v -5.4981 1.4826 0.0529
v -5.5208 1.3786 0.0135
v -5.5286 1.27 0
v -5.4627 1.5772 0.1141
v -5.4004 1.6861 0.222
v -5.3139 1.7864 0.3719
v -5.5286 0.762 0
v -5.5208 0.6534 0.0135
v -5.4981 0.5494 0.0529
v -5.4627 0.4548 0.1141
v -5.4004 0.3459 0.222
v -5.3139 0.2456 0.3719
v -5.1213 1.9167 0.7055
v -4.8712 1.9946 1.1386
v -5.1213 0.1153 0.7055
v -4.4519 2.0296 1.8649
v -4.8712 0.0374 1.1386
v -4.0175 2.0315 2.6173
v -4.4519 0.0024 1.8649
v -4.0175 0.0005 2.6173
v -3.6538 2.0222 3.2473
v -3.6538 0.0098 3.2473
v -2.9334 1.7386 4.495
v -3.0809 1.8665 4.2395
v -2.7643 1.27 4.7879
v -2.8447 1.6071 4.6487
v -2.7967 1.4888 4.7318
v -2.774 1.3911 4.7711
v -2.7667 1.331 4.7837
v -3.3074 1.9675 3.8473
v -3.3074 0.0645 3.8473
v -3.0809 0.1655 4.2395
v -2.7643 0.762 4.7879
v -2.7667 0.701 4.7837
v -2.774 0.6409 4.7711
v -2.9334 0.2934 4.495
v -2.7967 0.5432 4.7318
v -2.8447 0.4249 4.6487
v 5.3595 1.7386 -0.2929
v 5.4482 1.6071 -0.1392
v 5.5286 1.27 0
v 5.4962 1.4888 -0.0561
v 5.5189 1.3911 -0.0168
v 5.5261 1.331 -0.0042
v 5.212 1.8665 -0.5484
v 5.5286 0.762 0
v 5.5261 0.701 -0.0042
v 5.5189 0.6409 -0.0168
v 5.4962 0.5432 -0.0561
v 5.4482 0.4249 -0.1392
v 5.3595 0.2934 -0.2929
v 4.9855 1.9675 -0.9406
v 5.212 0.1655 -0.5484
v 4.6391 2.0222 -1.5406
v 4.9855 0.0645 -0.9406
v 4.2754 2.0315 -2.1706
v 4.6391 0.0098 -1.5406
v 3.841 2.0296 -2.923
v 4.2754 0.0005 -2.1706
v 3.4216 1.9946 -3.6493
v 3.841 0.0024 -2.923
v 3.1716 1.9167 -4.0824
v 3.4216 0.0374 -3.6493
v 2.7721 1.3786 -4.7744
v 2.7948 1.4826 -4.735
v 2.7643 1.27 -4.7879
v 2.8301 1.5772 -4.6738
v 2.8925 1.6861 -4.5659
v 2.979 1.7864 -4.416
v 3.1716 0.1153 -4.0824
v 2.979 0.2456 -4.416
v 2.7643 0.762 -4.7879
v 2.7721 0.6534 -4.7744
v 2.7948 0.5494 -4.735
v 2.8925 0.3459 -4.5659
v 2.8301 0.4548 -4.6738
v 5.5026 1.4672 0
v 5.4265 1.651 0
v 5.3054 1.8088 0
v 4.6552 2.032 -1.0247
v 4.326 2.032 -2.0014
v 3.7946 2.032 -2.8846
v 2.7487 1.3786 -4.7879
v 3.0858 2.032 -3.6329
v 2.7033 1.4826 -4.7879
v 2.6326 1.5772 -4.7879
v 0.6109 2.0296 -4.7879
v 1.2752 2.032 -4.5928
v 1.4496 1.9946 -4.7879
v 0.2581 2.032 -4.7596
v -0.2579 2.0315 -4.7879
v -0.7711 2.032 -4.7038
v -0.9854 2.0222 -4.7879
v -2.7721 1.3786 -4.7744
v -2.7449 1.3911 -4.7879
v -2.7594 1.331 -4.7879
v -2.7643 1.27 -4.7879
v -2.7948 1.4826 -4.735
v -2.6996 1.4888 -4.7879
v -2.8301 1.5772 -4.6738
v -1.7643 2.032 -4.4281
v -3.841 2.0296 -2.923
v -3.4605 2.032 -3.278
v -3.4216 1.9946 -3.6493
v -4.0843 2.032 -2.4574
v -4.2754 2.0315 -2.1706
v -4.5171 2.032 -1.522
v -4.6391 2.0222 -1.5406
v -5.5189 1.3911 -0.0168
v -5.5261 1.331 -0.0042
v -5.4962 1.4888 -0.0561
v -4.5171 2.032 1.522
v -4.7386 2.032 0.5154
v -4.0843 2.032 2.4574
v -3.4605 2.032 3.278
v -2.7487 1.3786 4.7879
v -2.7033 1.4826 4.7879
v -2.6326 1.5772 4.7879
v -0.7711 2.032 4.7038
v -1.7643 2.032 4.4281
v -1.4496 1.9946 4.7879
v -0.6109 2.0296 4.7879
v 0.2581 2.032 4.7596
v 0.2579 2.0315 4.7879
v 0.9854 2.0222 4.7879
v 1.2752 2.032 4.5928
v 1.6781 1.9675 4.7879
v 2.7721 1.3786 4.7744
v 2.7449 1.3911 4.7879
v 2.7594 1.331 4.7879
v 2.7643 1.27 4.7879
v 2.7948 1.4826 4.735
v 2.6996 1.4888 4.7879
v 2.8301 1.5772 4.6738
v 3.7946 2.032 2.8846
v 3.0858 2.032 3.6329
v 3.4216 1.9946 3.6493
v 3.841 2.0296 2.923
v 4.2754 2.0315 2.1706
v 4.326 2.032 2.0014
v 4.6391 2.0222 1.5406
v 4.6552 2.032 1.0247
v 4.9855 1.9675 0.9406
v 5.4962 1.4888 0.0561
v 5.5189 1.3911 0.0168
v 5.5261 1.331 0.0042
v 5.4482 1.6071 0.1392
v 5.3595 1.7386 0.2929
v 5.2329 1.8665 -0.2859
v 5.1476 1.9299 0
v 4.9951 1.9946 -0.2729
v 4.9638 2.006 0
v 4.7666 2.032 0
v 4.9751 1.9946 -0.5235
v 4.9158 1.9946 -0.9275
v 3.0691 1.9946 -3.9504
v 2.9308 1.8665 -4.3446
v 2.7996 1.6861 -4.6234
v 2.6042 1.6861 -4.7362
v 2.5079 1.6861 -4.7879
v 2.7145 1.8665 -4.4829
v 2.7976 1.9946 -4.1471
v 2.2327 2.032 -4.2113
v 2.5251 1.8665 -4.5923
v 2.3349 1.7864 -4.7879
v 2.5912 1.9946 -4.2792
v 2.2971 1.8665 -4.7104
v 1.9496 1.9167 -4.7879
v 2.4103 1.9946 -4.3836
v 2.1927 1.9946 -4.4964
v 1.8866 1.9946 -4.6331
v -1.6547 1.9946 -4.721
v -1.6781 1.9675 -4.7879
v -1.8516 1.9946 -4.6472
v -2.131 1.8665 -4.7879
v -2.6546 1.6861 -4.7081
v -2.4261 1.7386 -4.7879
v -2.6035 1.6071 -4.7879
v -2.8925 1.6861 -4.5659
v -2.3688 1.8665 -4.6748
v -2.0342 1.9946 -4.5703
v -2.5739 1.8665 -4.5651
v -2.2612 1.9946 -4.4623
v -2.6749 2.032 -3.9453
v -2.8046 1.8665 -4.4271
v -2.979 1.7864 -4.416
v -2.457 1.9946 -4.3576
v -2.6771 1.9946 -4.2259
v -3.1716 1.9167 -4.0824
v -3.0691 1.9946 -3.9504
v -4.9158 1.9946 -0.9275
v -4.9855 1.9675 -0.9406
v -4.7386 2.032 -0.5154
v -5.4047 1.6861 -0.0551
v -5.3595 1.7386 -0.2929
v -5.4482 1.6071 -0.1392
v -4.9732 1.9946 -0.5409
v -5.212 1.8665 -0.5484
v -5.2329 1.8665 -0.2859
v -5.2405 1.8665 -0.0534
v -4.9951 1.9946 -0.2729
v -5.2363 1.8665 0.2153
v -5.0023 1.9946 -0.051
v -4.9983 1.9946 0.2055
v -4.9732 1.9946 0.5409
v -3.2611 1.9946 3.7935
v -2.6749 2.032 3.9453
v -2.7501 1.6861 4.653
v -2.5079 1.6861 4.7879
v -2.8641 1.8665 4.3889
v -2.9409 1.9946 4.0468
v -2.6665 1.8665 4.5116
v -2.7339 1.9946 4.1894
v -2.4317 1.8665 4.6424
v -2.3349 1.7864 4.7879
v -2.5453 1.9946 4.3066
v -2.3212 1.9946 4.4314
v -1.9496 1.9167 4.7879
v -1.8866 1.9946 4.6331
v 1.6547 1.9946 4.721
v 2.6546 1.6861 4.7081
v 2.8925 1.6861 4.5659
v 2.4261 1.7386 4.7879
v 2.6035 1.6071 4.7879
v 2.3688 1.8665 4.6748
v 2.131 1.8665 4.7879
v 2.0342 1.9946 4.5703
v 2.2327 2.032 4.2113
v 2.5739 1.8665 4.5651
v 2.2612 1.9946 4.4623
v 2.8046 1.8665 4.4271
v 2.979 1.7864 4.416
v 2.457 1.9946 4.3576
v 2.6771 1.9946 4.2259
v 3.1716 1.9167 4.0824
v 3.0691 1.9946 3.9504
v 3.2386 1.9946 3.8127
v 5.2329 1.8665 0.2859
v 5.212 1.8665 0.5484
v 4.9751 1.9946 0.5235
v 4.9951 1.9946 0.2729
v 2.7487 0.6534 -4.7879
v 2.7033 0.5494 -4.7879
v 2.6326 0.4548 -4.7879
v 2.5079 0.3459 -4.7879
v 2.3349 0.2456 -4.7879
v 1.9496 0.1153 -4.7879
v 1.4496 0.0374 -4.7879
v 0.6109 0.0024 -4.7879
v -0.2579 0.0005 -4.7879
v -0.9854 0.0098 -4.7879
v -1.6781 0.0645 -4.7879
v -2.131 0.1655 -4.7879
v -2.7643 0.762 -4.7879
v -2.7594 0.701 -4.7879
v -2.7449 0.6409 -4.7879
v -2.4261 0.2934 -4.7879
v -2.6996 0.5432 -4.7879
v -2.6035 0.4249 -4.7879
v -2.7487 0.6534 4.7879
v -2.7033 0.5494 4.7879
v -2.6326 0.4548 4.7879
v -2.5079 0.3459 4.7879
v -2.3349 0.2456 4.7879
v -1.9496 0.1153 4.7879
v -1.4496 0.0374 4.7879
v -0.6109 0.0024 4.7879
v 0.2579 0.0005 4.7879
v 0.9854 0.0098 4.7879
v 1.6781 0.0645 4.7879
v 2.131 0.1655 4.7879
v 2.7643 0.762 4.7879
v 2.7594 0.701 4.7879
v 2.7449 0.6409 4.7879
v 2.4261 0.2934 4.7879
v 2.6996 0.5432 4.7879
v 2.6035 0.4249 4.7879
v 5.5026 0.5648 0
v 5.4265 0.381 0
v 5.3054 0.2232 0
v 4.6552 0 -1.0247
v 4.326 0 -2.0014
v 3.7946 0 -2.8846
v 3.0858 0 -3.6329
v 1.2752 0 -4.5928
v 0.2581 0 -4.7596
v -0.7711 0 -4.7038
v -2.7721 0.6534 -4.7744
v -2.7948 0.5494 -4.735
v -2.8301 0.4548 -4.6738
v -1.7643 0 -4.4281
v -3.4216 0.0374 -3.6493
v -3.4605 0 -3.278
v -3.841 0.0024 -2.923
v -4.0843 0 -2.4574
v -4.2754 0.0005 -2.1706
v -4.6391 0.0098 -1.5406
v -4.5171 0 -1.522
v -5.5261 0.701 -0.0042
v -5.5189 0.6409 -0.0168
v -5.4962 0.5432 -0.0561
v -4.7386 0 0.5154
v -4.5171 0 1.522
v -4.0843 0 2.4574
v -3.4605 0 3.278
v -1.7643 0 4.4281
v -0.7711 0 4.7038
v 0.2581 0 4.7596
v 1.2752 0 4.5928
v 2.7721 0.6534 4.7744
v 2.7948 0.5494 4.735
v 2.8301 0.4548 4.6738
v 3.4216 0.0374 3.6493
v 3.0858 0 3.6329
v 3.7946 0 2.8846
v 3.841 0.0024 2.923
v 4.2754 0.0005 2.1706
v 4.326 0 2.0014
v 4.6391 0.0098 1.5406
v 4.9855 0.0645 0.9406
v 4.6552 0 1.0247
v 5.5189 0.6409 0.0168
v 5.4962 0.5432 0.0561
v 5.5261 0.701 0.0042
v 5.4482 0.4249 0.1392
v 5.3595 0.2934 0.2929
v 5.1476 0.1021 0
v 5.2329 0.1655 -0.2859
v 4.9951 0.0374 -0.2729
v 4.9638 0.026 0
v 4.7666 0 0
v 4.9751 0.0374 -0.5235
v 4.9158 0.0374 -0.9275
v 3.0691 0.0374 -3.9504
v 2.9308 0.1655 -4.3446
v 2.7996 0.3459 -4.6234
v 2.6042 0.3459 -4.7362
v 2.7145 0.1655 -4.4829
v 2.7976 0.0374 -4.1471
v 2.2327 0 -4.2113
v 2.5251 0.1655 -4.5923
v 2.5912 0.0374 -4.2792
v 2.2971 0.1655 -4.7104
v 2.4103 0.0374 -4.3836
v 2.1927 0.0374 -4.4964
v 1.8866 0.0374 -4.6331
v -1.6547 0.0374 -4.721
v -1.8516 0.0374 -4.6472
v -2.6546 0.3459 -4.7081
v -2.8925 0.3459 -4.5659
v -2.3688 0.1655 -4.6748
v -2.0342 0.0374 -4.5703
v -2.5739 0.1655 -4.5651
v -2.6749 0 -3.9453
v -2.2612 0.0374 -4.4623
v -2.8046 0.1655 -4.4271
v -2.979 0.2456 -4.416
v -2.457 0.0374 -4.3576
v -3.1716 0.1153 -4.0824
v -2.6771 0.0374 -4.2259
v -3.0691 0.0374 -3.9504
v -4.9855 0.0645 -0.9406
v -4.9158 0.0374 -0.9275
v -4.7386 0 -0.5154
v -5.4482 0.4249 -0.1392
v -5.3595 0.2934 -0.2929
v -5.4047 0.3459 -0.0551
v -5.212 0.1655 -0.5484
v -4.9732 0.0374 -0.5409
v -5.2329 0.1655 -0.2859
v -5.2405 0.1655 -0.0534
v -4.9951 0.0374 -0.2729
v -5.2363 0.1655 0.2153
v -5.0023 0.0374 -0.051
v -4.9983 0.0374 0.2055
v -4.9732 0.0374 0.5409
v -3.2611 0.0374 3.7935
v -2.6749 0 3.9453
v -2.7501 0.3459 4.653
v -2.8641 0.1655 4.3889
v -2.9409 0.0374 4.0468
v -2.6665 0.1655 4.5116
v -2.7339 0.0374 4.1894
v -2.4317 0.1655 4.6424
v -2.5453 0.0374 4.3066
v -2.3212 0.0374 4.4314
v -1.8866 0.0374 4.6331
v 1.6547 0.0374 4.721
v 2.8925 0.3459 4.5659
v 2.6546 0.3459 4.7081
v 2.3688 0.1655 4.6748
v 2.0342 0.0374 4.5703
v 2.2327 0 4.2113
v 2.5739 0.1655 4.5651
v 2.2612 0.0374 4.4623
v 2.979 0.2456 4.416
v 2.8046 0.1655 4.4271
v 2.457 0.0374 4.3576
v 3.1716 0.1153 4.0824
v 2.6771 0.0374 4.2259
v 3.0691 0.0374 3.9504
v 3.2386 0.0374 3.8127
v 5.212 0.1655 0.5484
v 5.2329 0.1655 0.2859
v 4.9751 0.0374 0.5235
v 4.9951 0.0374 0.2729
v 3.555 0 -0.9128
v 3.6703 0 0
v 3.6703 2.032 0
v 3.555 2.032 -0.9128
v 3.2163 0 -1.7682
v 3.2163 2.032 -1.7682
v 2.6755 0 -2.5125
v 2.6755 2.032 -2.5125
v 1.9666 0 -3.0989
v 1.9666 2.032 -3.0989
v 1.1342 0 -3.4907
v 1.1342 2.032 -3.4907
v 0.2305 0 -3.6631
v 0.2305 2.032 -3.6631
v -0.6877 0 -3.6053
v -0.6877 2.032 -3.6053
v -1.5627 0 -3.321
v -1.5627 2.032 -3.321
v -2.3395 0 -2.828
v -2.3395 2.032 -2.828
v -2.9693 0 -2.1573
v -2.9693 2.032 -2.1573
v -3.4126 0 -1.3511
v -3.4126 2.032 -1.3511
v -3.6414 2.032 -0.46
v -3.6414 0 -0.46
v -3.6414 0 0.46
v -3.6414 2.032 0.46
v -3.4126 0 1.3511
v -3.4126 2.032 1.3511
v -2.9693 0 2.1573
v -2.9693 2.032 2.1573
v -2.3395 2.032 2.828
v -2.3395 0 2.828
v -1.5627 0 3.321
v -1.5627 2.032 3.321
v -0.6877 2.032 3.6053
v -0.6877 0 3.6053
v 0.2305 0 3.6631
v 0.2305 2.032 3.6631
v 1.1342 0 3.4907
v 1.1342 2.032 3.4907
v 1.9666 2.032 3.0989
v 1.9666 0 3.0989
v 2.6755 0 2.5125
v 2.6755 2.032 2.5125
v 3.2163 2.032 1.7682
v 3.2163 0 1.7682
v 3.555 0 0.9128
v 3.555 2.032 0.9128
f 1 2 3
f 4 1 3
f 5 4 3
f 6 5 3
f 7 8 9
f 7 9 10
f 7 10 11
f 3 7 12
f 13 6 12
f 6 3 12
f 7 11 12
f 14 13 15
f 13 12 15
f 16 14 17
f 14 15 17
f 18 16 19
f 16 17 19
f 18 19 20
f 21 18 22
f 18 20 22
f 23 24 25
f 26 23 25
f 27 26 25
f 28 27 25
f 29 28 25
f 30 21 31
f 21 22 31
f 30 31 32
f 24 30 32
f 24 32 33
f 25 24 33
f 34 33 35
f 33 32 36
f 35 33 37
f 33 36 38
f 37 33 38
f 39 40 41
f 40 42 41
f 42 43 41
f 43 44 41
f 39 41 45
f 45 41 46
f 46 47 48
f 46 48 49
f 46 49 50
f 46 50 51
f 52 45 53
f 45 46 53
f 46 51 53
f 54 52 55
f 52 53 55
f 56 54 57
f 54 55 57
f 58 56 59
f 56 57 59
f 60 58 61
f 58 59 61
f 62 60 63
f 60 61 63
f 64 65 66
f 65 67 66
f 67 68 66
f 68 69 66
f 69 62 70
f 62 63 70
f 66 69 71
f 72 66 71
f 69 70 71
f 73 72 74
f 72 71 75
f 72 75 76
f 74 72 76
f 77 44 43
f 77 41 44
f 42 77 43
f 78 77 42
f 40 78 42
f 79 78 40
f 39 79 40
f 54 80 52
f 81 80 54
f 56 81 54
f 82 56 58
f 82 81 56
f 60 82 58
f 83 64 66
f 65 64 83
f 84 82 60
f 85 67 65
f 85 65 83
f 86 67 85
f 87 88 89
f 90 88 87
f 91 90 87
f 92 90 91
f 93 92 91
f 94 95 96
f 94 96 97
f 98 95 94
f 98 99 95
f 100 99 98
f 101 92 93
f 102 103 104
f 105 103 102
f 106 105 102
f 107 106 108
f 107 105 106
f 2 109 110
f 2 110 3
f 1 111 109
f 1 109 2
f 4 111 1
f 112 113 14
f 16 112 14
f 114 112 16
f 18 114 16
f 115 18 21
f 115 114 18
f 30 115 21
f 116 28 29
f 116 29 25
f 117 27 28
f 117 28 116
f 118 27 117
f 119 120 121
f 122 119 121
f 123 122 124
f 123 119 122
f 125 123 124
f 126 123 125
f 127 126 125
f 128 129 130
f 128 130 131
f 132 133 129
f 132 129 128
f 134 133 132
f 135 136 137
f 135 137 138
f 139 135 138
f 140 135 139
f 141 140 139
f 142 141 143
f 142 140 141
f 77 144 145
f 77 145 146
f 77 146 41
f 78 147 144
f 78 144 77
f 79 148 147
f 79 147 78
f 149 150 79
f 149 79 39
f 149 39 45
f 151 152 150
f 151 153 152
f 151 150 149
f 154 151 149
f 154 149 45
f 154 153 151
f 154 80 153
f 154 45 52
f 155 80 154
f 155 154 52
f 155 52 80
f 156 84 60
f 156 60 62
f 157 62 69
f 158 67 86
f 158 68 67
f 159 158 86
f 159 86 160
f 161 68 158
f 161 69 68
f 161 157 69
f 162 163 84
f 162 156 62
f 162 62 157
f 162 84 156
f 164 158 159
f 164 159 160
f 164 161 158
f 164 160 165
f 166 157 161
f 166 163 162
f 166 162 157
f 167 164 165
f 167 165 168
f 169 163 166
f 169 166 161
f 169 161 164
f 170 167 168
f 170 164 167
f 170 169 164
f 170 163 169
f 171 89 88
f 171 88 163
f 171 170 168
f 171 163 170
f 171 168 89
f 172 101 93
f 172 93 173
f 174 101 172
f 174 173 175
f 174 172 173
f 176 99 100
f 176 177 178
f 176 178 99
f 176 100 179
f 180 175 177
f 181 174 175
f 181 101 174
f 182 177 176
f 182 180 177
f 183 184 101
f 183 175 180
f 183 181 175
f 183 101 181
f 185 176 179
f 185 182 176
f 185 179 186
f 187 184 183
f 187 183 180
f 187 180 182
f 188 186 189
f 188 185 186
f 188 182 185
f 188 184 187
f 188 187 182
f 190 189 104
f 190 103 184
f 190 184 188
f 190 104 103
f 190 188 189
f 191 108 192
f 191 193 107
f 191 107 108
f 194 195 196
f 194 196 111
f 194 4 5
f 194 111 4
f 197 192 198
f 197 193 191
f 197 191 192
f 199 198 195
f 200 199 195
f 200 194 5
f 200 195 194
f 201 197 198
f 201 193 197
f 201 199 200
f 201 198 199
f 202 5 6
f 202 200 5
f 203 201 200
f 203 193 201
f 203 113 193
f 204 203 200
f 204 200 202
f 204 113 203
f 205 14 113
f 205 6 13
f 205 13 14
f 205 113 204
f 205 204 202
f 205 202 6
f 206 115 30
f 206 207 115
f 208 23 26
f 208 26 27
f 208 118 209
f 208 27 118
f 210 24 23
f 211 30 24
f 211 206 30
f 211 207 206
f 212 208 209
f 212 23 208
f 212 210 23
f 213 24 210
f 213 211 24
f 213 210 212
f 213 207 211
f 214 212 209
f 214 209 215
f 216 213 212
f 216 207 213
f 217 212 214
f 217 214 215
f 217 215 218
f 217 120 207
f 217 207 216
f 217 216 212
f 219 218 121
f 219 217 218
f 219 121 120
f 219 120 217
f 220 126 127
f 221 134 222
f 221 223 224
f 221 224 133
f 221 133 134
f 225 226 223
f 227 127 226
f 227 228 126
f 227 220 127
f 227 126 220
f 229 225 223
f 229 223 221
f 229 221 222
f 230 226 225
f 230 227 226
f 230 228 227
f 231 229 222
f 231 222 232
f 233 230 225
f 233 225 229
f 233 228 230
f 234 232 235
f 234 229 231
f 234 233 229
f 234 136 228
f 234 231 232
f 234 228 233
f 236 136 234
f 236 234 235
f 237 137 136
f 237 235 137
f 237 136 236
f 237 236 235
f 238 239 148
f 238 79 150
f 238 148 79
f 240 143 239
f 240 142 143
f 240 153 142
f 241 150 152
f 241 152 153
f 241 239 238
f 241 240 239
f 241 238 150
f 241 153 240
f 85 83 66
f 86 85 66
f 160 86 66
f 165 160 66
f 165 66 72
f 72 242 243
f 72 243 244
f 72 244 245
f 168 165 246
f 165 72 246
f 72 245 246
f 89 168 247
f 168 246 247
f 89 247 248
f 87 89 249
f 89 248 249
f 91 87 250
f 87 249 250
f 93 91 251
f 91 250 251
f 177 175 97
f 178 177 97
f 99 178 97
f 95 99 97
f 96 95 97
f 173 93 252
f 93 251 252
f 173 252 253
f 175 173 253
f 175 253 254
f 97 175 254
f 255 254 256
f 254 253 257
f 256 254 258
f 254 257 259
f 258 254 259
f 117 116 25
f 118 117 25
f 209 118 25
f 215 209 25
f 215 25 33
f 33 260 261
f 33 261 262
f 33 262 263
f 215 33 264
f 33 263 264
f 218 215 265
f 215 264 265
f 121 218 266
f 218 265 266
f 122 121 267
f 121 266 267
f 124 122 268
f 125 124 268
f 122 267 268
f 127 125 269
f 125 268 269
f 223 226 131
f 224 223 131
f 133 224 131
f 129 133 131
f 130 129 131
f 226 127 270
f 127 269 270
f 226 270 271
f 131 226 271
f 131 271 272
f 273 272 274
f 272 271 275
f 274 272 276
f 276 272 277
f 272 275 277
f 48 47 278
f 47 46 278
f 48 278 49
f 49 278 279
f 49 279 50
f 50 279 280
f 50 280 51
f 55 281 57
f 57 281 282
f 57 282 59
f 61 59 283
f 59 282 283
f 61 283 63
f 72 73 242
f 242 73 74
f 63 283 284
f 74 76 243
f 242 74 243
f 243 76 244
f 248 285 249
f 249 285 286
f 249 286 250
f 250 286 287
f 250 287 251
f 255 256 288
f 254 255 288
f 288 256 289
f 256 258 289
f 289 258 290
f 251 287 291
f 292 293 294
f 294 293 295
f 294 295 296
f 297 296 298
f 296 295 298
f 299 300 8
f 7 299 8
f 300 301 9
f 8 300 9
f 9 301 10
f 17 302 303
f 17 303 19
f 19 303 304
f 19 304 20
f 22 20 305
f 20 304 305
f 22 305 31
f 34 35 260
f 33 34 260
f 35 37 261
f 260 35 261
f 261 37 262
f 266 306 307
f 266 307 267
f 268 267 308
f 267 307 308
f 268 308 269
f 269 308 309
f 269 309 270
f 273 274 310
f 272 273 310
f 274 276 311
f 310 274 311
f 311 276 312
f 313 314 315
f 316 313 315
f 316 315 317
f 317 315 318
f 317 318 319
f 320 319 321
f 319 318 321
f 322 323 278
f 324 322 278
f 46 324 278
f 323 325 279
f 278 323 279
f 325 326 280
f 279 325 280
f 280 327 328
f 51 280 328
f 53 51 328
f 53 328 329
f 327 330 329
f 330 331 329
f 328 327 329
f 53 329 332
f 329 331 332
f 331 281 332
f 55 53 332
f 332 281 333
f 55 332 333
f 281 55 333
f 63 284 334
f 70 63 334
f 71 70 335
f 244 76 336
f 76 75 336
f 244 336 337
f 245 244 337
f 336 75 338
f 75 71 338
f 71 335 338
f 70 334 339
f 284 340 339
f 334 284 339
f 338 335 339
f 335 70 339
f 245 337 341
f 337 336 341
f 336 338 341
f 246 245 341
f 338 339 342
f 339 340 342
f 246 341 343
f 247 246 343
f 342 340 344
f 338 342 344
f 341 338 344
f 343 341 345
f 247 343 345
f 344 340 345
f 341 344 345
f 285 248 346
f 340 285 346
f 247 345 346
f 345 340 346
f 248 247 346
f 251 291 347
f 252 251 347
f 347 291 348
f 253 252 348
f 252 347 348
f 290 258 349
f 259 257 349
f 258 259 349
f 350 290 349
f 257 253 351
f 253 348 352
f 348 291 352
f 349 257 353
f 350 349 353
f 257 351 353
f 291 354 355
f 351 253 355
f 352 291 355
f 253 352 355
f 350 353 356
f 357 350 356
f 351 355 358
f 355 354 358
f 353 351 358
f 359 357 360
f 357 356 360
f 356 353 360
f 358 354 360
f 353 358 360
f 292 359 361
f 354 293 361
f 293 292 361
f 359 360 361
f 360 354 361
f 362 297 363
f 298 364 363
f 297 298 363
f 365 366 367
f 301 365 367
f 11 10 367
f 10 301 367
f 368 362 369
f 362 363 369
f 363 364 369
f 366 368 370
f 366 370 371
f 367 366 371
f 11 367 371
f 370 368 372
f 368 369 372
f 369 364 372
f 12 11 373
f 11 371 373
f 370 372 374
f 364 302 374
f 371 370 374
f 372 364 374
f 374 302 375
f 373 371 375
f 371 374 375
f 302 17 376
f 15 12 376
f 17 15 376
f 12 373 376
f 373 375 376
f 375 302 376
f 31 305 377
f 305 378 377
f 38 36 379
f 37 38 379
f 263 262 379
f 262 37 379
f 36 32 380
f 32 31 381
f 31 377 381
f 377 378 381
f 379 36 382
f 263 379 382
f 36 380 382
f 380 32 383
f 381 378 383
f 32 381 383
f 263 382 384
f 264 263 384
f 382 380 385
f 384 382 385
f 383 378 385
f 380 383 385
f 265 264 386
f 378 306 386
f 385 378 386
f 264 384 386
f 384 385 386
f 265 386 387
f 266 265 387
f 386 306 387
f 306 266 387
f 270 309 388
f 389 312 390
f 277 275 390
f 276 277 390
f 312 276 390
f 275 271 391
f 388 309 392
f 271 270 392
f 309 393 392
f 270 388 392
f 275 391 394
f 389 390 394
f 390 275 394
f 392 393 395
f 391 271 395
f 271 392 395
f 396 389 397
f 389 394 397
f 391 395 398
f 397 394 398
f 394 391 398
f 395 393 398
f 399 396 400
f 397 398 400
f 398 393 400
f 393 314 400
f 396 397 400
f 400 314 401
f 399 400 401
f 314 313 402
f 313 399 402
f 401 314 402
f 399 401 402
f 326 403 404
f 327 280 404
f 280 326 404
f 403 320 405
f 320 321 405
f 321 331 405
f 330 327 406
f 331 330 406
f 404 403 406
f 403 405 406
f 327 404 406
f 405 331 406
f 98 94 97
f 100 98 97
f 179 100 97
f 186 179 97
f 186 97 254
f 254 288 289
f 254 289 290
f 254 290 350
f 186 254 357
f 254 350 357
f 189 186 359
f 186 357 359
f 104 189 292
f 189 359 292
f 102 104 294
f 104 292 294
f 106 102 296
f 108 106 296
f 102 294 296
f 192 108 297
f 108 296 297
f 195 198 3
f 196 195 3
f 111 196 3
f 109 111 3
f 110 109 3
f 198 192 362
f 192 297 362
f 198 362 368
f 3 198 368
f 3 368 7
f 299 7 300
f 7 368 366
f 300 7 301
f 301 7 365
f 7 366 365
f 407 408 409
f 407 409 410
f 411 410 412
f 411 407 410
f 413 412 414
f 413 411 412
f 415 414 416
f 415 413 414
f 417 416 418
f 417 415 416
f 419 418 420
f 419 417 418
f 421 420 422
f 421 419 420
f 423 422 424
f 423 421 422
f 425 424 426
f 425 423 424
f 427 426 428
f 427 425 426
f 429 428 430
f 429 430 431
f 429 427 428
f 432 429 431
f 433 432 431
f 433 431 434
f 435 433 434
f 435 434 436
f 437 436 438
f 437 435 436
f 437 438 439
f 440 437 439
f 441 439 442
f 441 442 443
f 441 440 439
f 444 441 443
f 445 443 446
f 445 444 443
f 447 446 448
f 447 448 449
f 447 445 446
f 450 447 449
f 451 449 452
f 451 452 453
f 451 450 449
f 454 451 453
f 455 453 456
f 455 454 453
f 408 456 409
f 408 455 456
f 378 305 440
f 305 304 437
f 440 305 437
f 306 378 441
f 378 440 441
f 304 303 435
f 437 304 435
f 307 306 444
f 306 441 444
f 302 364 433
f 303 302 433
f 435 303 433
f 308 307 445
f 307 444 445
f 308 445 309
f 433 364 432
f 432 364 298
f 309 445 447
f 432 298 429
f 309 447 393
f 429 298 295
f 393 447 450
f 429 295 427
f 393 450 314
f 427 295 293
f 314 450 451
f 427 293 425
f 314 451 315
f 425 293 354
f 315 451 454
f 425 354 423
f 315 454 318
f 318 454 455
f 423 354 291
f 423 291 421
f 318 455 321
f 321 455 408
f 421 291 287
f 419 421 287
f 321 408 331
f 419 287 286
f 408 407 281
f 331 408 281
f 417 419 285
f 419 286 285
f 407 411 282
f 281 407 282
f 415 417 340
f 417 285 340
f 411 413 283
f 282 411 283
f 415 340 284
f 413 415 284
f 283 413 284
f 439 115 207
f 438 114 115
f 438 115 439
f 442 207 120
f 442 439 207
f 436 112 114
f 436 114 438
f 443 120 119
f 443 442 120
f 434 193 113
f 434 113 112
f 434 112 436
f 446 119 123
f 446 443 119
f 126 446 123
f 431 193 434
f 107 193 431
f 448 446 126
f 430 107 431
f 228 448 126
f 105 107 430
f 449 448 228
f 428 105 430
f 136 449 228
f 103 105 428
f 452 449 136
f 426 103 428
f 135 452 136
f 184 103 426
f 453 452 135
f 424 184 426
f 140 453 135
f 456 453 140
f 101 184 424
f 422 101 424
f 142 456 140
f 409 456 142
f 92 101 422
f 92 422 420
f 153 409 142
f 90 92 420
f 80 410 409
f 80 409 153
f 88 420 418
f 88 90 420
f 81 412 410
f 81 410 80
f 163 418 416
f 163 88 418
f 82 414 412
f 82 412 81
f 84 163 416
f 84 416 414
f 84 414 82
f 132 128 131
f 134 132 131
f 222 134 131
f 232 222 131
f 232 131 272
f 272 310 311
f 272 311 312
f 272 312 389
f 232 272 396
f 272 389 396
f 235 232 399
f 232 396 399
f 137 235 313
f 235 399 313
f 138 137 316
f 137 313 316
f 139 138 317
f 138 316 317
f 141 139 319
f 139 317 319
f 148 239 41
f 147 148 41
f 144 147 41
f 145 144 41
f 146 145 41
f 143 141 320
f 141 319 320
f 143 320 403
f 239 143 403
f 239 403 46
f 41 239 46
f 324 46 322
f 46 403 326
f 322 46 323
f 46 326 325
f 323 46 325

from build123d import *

# Parameters (mm, degrees)
SKETCH1_R           = 3.6703
BOSS_EXTRUDE1_DEPTH = 2.032


with BuildPart() as part:
    # Sketch1 → Boss-Extrude1 (new body)
    with BuildSketch(Plane(origin=(0, 0, 0), x_dir=(1, 0, 0), z_dir=(0, 1, 0))):
        Polygon((-2.764295354, 4.7879), (-5.528590708, 0), (-2.764295354, -4.7879), (2.764295354, -4.7879), (5.528590708, 0), (2.764295354, 4.7879), align=None)
        Circle(SKETCH1_R, mode=Mode.SUBTRACT)
    extrude(amount=BOSS_EXTRUDE1_DEPTH)

    # Sketch2 → Cut-Revolve1 (revolve, cut)
    with BuildSketch(Plane.XY):
        with BuildLine():
            Line((4.766590708, 2.032), (5.528590708, 2.032))
            Line((5.528590708, 2.032), (5.528590708, 1.27))
            ThreePointArc((5.528590708, 1.27), (5.305406075, 1.808815367), (4.766590708, 2.032))
        make_face()
        with BuildLine():
            Line((4.766590708, 0), (5.528590708, 0))
            Line((5.528590708, 0), (5.528590708, 0.762))
            ThreePointArc((5.528590708, 0.762), (5.305406075, 0.223184633), (4.766590708, 0))
        make_face()
    revolve(axis=Axis((0, 0, 0), (0, 1, 0)), mode=Mode.SUBTRACT)


solid = part.part
